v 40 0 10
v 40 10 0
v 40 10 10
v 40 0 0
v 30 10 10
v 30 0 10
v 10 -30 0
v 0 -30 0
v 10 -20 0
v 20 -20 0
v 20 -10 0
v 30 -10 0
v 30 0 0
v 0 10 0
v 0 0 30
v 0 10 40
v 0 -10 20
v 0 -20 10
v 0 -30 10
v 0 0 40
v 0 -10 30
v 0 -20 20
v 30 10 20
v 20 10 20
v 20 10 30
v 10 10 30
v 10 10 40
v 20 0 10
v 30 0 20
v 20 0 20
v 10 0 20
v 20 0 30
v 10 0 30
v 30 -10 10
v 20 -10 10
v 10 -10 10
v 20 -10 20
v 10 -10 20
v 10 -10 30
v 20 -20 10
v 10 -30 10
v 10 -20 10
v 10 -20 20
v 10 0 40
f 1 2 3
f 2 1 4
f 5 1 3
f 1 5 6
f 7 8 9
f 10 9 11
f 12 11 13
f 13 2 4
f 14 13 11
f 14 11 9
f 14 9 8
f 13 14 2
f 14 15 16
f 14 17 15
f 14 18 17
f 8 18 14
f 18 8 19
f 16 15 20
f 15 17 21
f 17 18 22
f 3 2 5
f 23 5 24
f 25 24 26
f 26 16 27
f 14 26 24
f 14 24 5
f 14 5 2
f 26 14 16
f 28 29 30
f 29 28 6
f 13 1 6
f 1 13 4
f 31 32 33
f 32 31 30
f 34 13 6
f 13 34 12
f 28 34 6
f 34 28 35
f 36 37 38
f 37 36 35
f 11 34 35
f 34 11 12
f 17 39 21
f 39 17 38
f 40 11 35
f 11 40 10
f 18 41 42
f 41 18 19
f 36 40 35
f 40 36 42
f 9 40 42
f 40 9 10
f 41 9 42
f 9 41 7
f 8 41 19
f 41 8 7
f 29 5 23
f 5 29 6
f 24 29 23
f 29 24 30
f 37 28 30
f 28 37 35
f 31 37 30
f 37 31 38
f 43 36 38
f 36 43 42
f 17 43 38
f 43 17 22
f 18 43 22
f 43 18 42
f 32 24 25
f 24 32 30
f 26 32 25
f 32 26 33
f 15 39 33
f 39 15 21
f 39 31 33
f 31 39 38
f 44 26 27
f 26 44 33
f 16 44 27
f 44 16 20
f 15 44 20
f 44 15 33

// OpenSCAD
resize([40, 40, 40])
	union() {
		cube([4, 1, 1]);
		translate([0, -1, 0]) cube([3, 1, 1]);
		translate([0, -2, 0]) cube([2, 1, 1]);
		translate([0, -3, 0]) cube(1);
		translate([0, 0, 1]) cube([3, 1, 1]);
		translate([0, -1, 1]) cube([2, 1, 1]);
		translate([0, -2, 1]) cube(1);
		translate([0, 0, 2]) cube([2, 1, 1]);
		translate([0, -1, 2]) cube(1);
		translate([0, 0, 3]) cube(1);
	}
